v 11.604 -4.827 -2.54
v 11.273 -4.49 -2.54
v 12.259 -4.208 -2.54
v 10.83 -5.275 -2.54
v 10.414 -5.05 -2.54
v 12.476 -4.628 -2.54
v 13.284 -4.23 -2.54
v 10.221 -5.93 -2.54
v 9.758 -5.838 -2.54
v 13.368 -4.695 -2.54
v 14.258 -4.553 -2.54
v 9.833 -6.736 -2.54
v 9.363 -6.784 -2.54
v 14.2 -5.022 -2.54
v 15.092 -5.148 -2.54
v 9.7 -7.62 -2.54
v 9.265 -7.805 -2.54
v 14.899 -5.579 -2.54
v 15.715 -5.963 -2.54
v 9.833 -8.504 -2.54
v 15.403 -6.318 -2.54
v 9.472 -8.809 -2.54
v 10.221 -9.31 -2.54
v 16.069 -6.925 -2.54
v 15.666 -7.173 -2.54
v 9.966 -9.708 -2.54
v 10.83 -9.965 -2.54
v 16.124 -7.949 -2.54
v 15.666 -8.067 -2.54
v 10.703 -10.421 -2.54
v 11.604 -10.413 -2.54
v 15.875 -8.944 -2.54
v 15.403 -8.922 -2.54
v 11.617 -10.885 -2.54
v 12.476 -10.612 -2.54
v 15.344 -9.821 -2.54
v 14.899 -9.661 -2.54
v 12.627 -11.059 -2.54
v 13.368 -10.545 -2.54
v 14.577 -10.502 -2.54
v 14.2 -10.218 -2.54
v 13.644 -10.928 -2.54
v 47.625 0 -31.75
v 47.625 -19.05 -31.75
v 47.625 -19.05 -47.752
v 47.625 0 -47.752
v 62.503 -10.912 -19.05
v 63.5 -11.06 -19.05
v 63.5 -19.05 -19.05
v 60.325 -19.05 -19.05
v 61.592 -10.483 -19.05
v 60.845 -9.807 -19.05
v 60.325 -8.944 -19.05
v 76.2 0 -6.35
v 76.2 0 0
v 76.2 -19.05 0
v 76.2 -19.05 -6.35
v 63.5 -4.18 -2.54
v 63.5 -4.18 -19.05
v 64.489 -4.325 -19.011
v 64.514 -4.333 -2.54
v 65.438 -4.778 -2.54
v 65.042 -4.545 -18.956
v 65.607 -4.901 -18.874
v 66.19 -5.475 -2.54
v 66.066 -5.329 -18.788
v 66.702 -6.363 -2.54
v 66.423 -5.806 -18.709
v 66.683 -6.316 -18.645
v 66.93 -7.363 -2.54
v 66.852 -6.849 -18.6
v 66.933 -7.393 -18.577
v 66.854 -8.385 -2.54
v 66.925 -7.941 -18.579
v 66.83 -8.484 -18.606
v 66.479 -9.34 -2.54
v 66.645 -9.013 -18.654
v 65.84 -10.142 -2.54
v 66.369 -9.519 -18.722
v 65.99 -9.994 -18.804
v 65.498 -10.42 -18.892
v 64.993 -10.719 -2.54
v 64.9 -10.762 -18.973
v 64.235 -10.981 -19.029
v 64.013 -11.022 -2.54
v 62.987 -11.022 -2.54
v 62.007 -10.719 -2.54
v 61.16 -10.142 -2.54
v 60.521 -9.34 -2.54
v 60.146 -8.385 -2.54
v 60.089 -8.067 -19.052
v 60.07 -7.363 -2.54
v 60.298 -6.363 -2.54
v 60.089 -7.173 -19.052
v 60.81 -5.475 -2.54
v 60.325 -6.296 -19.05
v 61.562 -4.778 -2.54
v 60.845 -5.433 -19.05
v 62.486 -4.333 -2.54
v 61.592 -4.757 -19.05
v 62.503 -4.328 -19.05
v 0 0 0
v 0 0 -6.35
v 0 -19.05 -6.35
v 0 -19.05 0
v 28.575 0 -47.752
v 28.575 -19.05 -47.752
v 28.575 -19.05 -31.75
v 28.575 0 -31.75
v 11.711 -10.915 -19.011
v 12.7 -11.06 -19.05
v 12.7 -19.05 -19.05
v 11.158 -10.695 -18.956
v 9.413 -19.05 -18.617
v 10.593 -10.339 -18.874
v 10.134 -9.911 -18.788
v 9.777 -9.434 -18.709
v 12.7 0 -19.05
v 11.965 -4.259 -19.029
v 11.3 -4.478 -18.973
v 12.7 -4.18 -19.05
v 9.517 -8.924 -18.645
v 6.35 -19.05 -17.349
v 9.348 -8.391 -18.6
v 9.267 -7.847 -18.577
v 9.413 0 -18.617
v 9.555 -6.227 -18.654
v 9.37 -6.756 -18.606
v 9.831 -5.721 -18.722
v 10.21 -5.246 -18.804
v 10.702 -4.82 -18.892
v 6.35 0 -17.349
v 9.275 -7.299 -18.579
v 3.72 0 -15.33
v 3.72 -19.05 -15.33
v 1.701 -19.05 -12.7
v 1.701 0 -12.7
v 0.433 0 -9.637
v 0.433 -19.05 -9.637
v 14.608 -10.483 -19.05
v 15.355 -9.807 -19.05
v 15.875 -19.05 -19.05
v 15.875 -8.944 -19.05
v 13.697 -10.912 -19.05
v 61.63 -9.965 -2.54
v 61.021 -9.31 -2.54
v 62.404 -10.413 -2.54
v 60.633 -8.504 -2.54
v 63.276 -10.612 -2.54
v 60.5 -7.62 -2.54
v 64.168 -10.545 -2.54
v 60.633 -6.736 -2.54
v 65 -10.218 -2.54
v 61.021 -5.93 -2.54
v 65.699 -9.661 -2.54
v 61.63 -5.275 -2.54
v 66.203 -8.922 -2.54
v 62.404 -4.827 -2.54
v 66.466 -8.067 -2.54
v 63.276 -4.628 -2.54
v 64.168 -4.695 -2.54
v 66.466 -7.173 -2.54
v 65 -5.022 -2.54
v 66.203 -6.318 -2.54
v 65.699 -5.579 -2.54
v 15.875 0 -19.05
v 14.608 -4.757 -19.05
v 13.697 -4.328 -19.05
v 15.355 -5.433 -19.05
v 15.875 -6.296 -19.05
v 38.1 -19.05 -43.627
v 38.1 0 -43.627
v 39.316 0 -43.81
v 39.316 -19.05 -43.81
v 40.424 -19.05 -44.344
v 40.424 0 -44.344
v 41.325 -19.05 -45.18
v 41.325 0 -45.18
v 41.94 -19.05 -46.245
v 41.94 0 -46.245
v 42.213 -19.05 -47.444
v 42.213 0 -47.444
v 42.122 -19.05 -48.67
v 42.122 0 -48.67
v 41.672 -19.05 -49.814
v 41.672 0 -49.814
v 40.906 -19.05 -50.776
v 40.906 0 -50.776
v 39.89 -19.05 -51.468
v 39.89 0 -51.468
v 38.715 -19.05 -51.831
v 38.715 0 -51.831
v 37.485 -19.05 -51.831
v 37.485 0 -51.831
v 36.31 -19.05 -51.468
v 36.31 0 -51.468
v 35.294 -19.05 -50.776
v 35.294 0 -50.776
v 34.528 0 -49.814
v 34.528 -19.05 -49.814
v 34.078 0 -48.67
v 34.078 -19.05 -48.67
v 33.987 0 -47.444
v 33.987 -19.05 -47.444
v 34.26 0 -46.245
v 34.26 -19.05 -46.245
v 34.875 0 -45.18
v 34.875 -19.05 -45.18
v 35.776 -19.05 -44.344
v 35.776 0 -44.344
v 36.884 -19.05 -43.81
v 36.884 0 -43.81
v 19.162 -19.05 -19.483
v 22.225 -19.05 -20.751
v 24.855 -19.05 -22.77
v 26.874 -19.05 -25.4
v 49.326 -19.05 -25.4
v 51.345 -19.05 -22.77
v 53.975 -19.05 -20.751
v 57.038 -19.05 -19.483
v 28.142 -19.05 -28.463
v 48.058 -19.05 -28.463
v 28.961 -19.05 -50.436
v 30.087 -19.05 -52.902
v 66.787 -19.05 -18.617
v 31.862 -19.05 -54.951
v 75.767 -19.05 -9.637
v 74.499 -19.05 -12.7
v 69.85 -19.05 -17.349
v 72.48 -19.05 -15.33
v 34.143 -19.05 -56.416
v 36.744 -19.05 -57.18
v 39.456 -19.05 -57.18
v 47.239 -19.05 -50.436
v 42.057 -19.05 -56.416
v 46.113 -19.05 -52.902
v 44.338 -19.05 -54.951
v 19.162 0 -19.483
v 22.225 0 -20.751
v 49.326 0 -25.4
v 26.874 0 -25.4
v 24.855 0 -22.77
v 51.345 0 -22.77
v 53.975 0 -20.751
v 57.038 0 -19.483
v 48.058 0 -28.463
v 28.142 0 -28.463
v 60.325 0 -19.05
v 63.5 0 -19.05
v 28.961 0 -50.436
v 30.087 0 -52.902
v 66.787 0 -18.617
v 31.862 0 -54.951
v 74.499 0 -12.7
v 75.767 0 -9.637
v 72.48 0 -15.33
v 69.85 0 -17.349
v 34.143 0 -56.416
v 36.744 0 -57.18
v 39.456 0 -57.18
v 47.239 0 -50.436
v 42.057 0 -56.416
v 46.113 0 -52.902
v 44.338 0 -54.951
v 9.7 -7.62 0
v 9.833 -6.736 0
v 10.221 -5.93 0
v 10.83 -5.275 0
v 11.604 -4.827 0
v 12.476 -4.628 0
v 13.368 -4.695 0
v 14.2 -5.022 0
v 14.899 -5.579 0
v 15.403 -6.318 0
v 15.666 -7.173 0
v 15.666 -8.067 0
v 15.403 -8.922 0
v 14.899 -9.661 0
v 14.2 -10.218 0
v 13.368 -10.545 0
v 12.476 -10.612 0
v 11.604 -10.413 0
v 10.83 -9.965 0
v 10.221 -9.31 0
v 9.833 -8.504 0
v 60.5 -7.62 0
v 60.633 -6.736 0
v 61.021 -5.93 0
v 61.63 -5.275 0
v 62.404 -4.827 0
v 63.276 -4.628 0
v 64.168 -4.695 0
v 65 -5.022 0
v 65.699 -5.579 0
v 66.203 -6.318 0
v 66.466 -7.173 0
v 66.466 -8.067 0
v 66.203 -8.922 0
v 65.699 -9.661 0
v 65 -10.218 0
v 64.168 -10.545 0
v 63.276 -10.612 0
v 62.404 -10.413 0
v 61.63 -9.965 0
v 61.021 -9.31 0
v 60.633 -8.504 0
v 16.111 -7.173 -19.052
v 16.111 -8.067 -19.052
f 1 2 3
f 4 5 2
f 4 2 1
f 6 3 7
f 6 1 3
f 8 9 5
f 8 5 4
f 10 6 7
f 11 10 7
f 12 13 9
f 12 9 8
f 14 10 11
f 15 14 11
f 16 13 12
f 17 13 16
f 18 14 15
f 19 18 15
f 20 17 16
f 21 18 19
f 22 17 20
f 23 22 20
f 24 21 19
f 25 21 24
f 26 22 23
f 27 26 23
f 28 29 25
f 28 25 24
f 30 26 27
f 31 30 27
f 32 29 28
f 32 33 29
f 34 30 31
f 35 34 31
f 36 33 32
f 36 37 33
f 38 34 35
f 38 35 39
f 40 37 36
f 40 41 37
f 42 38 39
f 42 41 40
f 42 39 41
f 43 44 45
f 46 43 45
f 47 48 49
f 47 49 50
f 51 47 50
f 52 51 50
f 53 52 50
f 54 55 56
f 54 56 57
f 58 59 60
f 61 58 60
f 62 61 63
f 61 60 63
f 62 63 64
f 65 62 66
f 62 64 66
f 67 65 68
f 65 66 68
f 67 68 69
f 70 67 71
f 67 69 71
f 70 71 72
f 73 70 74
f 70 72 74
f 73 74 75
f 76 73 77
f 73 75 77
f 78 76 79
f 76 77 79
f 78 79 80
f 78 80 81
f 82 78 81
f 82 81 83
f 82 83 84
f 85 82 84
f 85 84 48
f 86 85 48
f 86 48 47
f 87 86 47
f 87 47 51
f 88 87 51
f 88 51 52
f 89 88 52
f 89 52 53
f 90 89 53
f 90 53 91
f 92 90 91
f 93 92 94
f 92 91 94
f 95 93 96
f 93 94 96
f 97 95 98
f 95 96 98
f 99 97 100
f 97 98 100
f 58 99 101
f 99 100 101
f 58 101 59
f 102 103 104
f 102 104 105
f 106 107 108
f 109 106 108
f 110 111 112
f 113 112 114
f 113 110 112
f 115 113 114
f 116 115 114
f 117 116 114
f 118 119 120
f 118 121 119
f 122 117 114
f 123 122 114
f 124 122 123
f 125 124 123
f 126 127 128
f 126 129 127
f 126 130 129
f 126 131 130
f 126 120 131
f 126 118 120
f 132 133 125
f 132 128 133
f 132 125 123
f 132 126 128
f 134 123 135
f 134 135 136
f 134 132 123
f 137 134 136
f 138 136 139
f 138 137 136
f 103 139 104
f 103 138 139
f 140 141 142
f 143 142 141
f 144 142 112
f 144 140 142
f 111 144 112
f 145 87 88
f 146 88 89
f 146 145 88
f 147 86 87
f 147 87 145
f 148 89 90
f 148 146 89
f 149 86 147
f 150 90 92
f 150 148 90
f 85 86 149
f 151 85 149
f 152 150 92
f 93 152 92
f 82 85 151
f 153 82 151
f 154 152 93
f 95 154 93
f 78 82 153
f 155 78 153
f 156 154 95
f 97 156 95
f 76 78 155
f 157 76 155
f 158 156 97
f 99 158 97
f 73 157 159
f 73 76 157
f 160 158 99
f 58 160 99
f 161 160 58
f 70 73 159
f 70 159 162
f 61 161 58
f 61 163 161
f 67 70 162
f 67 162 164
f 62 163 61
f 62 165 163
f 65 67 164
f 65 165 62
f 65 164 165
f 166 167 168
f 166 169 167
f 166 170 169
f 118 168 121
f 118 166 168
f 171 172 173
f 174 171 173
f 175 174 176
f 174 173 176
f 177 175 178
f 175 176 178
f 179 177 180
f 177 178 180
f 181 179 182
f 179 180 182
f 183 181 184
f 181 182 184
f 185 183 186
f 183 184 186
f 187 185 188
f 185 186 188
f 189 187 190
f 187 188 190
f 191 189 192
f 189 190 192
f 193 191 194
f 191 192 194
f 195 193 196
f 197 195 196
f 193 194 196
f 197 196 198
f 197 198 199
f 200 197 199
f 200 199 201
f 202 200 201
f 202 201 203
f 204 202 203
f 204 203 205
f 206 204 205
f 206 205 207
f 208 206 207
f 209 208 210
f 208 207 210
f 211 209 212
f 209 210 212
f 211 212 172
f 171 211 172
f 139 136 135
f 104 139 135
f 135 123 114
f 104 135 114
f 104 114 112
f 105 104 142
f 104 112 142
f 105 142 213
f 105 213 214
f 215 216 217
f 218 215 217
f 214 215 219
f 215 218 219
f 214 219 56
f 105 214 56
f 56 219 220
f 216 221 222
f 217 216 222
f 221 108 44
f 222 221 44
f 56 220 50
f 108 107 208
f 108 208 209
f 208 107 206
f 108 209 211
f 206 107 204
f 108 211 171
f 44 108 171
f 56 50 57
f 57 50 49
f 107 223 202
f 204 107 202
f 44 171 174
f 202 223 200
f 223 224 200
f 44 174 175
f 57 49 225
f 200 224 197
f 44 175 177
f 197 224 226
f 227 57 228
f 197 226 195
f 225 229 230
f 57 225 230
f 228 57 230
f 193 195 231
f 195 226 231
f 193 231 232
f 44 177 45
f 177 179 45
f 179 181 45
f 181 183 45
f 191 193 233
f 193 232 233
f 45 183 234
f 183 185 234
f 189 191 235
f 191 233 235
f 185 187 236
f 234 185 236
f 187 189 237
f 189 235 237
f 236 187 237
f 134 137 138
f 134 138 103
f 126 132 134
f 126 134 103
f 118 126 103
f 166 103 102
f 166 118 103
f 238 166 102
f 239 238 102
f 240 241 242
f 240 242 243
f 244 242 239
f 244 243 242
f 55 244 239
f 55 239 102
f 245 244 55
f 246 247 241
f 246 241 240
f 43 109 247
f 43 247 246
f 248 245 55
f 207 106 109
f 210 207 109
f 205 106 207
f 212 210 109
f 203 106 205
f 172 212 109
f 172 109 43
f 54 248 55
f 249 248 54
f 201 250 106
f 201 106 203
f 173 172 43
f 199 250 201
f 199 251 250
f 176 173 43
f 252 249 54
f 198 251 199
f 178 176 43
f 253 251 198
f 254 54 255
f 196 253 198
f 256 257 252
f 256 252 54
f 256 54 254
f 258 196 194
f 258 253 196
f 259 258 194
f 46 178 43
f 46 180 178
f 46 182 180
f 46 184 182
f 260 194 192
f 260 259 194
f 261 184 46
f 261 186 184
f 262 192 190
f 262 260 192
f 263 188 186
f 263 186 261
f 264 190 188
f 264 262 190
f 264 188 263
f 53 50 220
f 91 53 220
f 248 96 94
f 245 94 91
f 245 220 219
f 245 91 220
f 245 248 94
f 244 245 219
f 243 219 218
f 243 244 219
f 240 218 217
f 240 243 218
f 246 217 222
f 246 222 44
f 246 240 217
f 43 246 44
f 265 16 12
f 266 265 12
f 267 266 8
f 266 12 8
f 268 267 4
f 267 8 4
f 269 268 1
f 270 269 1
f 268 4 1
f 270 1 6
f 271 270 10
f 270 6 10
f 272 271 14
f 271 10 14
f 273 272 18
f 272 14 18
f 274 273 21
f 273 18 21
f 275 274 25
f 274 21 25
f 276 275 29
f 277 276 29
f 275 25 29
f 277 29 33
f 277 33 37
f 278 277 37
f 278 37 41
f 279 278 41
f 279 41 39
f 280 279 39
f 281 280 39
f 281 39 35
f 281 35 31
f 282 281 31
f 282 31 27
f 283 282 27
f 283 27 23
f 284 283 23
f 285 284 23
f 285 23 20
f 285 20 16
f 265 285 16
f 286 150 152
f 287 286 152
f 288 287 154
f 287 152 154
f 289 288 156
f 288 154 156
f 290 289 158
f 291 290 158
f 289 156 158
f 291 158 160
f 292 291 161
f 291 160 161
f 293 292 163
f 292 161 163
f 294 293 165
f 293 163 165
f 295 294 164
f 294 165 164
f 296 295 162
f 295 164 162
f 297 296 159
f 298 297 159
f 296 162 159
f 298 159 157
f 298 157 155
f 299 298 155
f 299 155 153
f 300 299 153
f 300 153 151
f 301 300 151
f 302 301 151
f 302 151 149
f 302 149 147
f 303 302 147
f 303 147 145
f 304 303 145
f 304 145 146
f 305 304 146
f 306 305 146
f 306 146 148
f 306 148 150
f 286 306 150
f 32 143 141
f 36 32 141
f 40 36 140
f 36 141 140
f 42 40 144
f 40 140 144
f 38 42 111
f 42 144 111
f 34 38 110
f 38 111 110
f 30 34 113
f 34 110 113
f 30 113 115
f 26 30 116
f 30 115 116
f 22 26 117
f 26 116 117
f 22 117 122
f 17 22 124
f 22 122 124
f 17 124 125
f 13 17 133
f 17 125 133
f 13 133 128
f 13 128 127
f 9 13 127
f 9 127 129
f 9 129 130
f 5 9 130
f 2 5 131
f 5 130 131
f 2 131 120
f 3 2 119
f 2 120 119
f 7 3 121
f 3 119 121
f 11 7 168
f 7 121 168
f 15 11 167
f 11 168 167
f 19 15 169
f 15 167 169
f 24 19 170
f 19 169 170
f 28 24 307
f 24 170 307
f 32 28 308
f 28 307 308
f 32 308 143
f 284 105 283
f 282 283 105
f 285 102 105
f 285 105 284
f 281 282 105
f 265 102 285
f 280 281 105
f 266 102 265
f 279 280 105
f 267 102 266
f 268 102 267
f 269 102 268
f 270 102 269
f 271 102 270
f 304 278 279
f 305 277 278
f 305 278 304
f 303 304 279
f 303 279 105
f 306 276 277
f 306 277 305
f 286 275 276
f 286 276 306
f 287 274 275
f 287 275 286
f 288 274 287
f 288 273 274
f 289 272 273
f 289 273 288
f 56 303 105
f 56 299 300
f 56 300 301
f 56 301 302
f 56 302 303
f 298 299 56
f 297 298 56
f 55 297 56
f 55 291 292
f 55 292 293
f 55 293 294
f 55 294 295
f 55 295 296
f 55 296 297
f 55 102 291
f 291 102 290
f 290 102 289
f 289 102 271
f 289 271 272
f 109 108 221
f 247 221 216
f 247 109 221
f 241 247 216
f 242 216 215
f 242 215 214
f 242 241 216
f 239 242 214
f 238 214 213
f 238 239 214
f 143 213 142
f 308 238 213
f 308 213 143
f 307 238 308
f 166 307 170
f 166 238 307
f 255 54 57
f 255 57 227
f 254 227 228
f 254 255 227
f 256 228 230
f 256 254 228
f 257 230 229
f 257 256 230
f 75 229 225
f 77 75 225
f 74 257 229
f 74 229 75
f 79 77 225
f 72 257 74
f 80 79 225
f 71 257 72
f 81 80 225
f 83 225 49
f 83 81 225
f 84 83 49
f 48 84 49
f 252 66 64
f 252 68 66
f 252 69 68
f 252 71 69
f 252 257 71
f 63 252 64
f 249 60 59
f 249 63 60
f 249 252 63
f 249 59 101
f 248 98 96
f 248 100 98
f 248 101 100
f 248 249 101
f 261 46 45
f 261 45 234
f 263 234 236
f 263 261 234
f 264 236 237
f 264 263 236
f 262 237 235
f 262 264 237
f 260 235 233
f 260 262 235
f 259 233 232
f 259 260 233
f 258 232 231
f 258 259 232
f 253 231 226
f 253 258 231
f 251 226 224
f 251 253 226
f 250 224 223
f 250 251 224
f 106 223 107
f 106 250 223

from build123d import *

# Parameters (mm, degrees)
SKETCH1_R               = 4.125
BOSS_EXTRUDE1_DEPTH     = 19.05
SKETCH2_R               = 3
CUT_EXTRUDE1_DEPTH      = 19.05
CUT_EXTRUDE2_DEPTH      = 16.51
CUT_EXTRUDE2_DEPTH_BACK = 16.51
SKETCH3_R               = 3.44


with BuildPart() as part:
    # Sketch1 → Boss-Extrude1 (new body)
    with BuildSketch(Plane(origin=(0, 0, 0), x_dir=(1, 0, 0), z_dir=(0, 1, 0))):
        with BuildLine():
            Line((0, 6.35), (0, 0))
            Line((0, 0), (41.275, 0))
            Line((41.275, 0), (60.325, 0))
            Line((60.325, 0), (76.2, 0))
            Line((76.2, 0), (76.2, 6.35))
            ThreePointArc((76.2, 6.35), (72.480256121, 15.330256121), (63.5, 19.05))
            Line((63.5, 19.05), (60.325, 19.05))
            ThreePointArc((60.325, 19.05), (51.344743879, 22.769743879), (47.625, 31.75))
            Line((47.625, 31.75), (47.625, 47.752))
            ThreePointArc((47.625, 47.752), (38.1, 57.277), (28.575, 47.752))
            Line((28.575, 47.752), (28.575, 31.75))
            ThreePointArc((28.575, 31.75), (24.855256121, 22.769743879), (15.875, 19.05))
            Line((15.875, 19.05), (12.7, 19.05))
            ThreePointArc((12.7, 19.05), (3.719743879, 15.330256121), (0, 6.35))
        make_face()
        with Locations((38.1, 47.752)):
            Circle(SKETCH1_R, mode=Mode.SUBTRACT)
    extrude(amount=-BOSS_EXTRUDE1_DEPTH)

    # Sketch2 → Cut-Extrude1 (cut)
    with BuildSketch(Plane(origin=(0, 0, -19.05), x_dir=(-1, 0, 0), z_dir=(0, 0, -1))):
        with Locations((-63.5, -7.62)):
            Circle(SKETCH2_R)
        with Locations((-12.7, -7.62)):
            Circle(SKETCH2_R)
    extrude(amount=-CUT_EXTRUDE1_DEPTH, mode=Mode.SUBTRACT)

    # Sketch3 → Cut-Extrude2 (cut, two sides: drawn at the far end of the back side and taken through both)
    with BuildSketch(Plane(origin=(0, 0, -19.05), x_dir=(-1, 0, 0), z_dir=(0, 0, -1)).offset(-CUT_EXTRUDE2_DEPTH_BACK)):
        with Locations((-63.5, -7.62)):
            Circle(SKETCH3_R)
        with Locations((-12.7, -7.62)):
            Circle(SKETCH3_R)
    extrude(amount=CUT_EXTRUDE2_DEPTH + CUT_EXTRUDE2_DEPTH_BACK, mode=Mode.SUBTRACT)


solid = part.part
